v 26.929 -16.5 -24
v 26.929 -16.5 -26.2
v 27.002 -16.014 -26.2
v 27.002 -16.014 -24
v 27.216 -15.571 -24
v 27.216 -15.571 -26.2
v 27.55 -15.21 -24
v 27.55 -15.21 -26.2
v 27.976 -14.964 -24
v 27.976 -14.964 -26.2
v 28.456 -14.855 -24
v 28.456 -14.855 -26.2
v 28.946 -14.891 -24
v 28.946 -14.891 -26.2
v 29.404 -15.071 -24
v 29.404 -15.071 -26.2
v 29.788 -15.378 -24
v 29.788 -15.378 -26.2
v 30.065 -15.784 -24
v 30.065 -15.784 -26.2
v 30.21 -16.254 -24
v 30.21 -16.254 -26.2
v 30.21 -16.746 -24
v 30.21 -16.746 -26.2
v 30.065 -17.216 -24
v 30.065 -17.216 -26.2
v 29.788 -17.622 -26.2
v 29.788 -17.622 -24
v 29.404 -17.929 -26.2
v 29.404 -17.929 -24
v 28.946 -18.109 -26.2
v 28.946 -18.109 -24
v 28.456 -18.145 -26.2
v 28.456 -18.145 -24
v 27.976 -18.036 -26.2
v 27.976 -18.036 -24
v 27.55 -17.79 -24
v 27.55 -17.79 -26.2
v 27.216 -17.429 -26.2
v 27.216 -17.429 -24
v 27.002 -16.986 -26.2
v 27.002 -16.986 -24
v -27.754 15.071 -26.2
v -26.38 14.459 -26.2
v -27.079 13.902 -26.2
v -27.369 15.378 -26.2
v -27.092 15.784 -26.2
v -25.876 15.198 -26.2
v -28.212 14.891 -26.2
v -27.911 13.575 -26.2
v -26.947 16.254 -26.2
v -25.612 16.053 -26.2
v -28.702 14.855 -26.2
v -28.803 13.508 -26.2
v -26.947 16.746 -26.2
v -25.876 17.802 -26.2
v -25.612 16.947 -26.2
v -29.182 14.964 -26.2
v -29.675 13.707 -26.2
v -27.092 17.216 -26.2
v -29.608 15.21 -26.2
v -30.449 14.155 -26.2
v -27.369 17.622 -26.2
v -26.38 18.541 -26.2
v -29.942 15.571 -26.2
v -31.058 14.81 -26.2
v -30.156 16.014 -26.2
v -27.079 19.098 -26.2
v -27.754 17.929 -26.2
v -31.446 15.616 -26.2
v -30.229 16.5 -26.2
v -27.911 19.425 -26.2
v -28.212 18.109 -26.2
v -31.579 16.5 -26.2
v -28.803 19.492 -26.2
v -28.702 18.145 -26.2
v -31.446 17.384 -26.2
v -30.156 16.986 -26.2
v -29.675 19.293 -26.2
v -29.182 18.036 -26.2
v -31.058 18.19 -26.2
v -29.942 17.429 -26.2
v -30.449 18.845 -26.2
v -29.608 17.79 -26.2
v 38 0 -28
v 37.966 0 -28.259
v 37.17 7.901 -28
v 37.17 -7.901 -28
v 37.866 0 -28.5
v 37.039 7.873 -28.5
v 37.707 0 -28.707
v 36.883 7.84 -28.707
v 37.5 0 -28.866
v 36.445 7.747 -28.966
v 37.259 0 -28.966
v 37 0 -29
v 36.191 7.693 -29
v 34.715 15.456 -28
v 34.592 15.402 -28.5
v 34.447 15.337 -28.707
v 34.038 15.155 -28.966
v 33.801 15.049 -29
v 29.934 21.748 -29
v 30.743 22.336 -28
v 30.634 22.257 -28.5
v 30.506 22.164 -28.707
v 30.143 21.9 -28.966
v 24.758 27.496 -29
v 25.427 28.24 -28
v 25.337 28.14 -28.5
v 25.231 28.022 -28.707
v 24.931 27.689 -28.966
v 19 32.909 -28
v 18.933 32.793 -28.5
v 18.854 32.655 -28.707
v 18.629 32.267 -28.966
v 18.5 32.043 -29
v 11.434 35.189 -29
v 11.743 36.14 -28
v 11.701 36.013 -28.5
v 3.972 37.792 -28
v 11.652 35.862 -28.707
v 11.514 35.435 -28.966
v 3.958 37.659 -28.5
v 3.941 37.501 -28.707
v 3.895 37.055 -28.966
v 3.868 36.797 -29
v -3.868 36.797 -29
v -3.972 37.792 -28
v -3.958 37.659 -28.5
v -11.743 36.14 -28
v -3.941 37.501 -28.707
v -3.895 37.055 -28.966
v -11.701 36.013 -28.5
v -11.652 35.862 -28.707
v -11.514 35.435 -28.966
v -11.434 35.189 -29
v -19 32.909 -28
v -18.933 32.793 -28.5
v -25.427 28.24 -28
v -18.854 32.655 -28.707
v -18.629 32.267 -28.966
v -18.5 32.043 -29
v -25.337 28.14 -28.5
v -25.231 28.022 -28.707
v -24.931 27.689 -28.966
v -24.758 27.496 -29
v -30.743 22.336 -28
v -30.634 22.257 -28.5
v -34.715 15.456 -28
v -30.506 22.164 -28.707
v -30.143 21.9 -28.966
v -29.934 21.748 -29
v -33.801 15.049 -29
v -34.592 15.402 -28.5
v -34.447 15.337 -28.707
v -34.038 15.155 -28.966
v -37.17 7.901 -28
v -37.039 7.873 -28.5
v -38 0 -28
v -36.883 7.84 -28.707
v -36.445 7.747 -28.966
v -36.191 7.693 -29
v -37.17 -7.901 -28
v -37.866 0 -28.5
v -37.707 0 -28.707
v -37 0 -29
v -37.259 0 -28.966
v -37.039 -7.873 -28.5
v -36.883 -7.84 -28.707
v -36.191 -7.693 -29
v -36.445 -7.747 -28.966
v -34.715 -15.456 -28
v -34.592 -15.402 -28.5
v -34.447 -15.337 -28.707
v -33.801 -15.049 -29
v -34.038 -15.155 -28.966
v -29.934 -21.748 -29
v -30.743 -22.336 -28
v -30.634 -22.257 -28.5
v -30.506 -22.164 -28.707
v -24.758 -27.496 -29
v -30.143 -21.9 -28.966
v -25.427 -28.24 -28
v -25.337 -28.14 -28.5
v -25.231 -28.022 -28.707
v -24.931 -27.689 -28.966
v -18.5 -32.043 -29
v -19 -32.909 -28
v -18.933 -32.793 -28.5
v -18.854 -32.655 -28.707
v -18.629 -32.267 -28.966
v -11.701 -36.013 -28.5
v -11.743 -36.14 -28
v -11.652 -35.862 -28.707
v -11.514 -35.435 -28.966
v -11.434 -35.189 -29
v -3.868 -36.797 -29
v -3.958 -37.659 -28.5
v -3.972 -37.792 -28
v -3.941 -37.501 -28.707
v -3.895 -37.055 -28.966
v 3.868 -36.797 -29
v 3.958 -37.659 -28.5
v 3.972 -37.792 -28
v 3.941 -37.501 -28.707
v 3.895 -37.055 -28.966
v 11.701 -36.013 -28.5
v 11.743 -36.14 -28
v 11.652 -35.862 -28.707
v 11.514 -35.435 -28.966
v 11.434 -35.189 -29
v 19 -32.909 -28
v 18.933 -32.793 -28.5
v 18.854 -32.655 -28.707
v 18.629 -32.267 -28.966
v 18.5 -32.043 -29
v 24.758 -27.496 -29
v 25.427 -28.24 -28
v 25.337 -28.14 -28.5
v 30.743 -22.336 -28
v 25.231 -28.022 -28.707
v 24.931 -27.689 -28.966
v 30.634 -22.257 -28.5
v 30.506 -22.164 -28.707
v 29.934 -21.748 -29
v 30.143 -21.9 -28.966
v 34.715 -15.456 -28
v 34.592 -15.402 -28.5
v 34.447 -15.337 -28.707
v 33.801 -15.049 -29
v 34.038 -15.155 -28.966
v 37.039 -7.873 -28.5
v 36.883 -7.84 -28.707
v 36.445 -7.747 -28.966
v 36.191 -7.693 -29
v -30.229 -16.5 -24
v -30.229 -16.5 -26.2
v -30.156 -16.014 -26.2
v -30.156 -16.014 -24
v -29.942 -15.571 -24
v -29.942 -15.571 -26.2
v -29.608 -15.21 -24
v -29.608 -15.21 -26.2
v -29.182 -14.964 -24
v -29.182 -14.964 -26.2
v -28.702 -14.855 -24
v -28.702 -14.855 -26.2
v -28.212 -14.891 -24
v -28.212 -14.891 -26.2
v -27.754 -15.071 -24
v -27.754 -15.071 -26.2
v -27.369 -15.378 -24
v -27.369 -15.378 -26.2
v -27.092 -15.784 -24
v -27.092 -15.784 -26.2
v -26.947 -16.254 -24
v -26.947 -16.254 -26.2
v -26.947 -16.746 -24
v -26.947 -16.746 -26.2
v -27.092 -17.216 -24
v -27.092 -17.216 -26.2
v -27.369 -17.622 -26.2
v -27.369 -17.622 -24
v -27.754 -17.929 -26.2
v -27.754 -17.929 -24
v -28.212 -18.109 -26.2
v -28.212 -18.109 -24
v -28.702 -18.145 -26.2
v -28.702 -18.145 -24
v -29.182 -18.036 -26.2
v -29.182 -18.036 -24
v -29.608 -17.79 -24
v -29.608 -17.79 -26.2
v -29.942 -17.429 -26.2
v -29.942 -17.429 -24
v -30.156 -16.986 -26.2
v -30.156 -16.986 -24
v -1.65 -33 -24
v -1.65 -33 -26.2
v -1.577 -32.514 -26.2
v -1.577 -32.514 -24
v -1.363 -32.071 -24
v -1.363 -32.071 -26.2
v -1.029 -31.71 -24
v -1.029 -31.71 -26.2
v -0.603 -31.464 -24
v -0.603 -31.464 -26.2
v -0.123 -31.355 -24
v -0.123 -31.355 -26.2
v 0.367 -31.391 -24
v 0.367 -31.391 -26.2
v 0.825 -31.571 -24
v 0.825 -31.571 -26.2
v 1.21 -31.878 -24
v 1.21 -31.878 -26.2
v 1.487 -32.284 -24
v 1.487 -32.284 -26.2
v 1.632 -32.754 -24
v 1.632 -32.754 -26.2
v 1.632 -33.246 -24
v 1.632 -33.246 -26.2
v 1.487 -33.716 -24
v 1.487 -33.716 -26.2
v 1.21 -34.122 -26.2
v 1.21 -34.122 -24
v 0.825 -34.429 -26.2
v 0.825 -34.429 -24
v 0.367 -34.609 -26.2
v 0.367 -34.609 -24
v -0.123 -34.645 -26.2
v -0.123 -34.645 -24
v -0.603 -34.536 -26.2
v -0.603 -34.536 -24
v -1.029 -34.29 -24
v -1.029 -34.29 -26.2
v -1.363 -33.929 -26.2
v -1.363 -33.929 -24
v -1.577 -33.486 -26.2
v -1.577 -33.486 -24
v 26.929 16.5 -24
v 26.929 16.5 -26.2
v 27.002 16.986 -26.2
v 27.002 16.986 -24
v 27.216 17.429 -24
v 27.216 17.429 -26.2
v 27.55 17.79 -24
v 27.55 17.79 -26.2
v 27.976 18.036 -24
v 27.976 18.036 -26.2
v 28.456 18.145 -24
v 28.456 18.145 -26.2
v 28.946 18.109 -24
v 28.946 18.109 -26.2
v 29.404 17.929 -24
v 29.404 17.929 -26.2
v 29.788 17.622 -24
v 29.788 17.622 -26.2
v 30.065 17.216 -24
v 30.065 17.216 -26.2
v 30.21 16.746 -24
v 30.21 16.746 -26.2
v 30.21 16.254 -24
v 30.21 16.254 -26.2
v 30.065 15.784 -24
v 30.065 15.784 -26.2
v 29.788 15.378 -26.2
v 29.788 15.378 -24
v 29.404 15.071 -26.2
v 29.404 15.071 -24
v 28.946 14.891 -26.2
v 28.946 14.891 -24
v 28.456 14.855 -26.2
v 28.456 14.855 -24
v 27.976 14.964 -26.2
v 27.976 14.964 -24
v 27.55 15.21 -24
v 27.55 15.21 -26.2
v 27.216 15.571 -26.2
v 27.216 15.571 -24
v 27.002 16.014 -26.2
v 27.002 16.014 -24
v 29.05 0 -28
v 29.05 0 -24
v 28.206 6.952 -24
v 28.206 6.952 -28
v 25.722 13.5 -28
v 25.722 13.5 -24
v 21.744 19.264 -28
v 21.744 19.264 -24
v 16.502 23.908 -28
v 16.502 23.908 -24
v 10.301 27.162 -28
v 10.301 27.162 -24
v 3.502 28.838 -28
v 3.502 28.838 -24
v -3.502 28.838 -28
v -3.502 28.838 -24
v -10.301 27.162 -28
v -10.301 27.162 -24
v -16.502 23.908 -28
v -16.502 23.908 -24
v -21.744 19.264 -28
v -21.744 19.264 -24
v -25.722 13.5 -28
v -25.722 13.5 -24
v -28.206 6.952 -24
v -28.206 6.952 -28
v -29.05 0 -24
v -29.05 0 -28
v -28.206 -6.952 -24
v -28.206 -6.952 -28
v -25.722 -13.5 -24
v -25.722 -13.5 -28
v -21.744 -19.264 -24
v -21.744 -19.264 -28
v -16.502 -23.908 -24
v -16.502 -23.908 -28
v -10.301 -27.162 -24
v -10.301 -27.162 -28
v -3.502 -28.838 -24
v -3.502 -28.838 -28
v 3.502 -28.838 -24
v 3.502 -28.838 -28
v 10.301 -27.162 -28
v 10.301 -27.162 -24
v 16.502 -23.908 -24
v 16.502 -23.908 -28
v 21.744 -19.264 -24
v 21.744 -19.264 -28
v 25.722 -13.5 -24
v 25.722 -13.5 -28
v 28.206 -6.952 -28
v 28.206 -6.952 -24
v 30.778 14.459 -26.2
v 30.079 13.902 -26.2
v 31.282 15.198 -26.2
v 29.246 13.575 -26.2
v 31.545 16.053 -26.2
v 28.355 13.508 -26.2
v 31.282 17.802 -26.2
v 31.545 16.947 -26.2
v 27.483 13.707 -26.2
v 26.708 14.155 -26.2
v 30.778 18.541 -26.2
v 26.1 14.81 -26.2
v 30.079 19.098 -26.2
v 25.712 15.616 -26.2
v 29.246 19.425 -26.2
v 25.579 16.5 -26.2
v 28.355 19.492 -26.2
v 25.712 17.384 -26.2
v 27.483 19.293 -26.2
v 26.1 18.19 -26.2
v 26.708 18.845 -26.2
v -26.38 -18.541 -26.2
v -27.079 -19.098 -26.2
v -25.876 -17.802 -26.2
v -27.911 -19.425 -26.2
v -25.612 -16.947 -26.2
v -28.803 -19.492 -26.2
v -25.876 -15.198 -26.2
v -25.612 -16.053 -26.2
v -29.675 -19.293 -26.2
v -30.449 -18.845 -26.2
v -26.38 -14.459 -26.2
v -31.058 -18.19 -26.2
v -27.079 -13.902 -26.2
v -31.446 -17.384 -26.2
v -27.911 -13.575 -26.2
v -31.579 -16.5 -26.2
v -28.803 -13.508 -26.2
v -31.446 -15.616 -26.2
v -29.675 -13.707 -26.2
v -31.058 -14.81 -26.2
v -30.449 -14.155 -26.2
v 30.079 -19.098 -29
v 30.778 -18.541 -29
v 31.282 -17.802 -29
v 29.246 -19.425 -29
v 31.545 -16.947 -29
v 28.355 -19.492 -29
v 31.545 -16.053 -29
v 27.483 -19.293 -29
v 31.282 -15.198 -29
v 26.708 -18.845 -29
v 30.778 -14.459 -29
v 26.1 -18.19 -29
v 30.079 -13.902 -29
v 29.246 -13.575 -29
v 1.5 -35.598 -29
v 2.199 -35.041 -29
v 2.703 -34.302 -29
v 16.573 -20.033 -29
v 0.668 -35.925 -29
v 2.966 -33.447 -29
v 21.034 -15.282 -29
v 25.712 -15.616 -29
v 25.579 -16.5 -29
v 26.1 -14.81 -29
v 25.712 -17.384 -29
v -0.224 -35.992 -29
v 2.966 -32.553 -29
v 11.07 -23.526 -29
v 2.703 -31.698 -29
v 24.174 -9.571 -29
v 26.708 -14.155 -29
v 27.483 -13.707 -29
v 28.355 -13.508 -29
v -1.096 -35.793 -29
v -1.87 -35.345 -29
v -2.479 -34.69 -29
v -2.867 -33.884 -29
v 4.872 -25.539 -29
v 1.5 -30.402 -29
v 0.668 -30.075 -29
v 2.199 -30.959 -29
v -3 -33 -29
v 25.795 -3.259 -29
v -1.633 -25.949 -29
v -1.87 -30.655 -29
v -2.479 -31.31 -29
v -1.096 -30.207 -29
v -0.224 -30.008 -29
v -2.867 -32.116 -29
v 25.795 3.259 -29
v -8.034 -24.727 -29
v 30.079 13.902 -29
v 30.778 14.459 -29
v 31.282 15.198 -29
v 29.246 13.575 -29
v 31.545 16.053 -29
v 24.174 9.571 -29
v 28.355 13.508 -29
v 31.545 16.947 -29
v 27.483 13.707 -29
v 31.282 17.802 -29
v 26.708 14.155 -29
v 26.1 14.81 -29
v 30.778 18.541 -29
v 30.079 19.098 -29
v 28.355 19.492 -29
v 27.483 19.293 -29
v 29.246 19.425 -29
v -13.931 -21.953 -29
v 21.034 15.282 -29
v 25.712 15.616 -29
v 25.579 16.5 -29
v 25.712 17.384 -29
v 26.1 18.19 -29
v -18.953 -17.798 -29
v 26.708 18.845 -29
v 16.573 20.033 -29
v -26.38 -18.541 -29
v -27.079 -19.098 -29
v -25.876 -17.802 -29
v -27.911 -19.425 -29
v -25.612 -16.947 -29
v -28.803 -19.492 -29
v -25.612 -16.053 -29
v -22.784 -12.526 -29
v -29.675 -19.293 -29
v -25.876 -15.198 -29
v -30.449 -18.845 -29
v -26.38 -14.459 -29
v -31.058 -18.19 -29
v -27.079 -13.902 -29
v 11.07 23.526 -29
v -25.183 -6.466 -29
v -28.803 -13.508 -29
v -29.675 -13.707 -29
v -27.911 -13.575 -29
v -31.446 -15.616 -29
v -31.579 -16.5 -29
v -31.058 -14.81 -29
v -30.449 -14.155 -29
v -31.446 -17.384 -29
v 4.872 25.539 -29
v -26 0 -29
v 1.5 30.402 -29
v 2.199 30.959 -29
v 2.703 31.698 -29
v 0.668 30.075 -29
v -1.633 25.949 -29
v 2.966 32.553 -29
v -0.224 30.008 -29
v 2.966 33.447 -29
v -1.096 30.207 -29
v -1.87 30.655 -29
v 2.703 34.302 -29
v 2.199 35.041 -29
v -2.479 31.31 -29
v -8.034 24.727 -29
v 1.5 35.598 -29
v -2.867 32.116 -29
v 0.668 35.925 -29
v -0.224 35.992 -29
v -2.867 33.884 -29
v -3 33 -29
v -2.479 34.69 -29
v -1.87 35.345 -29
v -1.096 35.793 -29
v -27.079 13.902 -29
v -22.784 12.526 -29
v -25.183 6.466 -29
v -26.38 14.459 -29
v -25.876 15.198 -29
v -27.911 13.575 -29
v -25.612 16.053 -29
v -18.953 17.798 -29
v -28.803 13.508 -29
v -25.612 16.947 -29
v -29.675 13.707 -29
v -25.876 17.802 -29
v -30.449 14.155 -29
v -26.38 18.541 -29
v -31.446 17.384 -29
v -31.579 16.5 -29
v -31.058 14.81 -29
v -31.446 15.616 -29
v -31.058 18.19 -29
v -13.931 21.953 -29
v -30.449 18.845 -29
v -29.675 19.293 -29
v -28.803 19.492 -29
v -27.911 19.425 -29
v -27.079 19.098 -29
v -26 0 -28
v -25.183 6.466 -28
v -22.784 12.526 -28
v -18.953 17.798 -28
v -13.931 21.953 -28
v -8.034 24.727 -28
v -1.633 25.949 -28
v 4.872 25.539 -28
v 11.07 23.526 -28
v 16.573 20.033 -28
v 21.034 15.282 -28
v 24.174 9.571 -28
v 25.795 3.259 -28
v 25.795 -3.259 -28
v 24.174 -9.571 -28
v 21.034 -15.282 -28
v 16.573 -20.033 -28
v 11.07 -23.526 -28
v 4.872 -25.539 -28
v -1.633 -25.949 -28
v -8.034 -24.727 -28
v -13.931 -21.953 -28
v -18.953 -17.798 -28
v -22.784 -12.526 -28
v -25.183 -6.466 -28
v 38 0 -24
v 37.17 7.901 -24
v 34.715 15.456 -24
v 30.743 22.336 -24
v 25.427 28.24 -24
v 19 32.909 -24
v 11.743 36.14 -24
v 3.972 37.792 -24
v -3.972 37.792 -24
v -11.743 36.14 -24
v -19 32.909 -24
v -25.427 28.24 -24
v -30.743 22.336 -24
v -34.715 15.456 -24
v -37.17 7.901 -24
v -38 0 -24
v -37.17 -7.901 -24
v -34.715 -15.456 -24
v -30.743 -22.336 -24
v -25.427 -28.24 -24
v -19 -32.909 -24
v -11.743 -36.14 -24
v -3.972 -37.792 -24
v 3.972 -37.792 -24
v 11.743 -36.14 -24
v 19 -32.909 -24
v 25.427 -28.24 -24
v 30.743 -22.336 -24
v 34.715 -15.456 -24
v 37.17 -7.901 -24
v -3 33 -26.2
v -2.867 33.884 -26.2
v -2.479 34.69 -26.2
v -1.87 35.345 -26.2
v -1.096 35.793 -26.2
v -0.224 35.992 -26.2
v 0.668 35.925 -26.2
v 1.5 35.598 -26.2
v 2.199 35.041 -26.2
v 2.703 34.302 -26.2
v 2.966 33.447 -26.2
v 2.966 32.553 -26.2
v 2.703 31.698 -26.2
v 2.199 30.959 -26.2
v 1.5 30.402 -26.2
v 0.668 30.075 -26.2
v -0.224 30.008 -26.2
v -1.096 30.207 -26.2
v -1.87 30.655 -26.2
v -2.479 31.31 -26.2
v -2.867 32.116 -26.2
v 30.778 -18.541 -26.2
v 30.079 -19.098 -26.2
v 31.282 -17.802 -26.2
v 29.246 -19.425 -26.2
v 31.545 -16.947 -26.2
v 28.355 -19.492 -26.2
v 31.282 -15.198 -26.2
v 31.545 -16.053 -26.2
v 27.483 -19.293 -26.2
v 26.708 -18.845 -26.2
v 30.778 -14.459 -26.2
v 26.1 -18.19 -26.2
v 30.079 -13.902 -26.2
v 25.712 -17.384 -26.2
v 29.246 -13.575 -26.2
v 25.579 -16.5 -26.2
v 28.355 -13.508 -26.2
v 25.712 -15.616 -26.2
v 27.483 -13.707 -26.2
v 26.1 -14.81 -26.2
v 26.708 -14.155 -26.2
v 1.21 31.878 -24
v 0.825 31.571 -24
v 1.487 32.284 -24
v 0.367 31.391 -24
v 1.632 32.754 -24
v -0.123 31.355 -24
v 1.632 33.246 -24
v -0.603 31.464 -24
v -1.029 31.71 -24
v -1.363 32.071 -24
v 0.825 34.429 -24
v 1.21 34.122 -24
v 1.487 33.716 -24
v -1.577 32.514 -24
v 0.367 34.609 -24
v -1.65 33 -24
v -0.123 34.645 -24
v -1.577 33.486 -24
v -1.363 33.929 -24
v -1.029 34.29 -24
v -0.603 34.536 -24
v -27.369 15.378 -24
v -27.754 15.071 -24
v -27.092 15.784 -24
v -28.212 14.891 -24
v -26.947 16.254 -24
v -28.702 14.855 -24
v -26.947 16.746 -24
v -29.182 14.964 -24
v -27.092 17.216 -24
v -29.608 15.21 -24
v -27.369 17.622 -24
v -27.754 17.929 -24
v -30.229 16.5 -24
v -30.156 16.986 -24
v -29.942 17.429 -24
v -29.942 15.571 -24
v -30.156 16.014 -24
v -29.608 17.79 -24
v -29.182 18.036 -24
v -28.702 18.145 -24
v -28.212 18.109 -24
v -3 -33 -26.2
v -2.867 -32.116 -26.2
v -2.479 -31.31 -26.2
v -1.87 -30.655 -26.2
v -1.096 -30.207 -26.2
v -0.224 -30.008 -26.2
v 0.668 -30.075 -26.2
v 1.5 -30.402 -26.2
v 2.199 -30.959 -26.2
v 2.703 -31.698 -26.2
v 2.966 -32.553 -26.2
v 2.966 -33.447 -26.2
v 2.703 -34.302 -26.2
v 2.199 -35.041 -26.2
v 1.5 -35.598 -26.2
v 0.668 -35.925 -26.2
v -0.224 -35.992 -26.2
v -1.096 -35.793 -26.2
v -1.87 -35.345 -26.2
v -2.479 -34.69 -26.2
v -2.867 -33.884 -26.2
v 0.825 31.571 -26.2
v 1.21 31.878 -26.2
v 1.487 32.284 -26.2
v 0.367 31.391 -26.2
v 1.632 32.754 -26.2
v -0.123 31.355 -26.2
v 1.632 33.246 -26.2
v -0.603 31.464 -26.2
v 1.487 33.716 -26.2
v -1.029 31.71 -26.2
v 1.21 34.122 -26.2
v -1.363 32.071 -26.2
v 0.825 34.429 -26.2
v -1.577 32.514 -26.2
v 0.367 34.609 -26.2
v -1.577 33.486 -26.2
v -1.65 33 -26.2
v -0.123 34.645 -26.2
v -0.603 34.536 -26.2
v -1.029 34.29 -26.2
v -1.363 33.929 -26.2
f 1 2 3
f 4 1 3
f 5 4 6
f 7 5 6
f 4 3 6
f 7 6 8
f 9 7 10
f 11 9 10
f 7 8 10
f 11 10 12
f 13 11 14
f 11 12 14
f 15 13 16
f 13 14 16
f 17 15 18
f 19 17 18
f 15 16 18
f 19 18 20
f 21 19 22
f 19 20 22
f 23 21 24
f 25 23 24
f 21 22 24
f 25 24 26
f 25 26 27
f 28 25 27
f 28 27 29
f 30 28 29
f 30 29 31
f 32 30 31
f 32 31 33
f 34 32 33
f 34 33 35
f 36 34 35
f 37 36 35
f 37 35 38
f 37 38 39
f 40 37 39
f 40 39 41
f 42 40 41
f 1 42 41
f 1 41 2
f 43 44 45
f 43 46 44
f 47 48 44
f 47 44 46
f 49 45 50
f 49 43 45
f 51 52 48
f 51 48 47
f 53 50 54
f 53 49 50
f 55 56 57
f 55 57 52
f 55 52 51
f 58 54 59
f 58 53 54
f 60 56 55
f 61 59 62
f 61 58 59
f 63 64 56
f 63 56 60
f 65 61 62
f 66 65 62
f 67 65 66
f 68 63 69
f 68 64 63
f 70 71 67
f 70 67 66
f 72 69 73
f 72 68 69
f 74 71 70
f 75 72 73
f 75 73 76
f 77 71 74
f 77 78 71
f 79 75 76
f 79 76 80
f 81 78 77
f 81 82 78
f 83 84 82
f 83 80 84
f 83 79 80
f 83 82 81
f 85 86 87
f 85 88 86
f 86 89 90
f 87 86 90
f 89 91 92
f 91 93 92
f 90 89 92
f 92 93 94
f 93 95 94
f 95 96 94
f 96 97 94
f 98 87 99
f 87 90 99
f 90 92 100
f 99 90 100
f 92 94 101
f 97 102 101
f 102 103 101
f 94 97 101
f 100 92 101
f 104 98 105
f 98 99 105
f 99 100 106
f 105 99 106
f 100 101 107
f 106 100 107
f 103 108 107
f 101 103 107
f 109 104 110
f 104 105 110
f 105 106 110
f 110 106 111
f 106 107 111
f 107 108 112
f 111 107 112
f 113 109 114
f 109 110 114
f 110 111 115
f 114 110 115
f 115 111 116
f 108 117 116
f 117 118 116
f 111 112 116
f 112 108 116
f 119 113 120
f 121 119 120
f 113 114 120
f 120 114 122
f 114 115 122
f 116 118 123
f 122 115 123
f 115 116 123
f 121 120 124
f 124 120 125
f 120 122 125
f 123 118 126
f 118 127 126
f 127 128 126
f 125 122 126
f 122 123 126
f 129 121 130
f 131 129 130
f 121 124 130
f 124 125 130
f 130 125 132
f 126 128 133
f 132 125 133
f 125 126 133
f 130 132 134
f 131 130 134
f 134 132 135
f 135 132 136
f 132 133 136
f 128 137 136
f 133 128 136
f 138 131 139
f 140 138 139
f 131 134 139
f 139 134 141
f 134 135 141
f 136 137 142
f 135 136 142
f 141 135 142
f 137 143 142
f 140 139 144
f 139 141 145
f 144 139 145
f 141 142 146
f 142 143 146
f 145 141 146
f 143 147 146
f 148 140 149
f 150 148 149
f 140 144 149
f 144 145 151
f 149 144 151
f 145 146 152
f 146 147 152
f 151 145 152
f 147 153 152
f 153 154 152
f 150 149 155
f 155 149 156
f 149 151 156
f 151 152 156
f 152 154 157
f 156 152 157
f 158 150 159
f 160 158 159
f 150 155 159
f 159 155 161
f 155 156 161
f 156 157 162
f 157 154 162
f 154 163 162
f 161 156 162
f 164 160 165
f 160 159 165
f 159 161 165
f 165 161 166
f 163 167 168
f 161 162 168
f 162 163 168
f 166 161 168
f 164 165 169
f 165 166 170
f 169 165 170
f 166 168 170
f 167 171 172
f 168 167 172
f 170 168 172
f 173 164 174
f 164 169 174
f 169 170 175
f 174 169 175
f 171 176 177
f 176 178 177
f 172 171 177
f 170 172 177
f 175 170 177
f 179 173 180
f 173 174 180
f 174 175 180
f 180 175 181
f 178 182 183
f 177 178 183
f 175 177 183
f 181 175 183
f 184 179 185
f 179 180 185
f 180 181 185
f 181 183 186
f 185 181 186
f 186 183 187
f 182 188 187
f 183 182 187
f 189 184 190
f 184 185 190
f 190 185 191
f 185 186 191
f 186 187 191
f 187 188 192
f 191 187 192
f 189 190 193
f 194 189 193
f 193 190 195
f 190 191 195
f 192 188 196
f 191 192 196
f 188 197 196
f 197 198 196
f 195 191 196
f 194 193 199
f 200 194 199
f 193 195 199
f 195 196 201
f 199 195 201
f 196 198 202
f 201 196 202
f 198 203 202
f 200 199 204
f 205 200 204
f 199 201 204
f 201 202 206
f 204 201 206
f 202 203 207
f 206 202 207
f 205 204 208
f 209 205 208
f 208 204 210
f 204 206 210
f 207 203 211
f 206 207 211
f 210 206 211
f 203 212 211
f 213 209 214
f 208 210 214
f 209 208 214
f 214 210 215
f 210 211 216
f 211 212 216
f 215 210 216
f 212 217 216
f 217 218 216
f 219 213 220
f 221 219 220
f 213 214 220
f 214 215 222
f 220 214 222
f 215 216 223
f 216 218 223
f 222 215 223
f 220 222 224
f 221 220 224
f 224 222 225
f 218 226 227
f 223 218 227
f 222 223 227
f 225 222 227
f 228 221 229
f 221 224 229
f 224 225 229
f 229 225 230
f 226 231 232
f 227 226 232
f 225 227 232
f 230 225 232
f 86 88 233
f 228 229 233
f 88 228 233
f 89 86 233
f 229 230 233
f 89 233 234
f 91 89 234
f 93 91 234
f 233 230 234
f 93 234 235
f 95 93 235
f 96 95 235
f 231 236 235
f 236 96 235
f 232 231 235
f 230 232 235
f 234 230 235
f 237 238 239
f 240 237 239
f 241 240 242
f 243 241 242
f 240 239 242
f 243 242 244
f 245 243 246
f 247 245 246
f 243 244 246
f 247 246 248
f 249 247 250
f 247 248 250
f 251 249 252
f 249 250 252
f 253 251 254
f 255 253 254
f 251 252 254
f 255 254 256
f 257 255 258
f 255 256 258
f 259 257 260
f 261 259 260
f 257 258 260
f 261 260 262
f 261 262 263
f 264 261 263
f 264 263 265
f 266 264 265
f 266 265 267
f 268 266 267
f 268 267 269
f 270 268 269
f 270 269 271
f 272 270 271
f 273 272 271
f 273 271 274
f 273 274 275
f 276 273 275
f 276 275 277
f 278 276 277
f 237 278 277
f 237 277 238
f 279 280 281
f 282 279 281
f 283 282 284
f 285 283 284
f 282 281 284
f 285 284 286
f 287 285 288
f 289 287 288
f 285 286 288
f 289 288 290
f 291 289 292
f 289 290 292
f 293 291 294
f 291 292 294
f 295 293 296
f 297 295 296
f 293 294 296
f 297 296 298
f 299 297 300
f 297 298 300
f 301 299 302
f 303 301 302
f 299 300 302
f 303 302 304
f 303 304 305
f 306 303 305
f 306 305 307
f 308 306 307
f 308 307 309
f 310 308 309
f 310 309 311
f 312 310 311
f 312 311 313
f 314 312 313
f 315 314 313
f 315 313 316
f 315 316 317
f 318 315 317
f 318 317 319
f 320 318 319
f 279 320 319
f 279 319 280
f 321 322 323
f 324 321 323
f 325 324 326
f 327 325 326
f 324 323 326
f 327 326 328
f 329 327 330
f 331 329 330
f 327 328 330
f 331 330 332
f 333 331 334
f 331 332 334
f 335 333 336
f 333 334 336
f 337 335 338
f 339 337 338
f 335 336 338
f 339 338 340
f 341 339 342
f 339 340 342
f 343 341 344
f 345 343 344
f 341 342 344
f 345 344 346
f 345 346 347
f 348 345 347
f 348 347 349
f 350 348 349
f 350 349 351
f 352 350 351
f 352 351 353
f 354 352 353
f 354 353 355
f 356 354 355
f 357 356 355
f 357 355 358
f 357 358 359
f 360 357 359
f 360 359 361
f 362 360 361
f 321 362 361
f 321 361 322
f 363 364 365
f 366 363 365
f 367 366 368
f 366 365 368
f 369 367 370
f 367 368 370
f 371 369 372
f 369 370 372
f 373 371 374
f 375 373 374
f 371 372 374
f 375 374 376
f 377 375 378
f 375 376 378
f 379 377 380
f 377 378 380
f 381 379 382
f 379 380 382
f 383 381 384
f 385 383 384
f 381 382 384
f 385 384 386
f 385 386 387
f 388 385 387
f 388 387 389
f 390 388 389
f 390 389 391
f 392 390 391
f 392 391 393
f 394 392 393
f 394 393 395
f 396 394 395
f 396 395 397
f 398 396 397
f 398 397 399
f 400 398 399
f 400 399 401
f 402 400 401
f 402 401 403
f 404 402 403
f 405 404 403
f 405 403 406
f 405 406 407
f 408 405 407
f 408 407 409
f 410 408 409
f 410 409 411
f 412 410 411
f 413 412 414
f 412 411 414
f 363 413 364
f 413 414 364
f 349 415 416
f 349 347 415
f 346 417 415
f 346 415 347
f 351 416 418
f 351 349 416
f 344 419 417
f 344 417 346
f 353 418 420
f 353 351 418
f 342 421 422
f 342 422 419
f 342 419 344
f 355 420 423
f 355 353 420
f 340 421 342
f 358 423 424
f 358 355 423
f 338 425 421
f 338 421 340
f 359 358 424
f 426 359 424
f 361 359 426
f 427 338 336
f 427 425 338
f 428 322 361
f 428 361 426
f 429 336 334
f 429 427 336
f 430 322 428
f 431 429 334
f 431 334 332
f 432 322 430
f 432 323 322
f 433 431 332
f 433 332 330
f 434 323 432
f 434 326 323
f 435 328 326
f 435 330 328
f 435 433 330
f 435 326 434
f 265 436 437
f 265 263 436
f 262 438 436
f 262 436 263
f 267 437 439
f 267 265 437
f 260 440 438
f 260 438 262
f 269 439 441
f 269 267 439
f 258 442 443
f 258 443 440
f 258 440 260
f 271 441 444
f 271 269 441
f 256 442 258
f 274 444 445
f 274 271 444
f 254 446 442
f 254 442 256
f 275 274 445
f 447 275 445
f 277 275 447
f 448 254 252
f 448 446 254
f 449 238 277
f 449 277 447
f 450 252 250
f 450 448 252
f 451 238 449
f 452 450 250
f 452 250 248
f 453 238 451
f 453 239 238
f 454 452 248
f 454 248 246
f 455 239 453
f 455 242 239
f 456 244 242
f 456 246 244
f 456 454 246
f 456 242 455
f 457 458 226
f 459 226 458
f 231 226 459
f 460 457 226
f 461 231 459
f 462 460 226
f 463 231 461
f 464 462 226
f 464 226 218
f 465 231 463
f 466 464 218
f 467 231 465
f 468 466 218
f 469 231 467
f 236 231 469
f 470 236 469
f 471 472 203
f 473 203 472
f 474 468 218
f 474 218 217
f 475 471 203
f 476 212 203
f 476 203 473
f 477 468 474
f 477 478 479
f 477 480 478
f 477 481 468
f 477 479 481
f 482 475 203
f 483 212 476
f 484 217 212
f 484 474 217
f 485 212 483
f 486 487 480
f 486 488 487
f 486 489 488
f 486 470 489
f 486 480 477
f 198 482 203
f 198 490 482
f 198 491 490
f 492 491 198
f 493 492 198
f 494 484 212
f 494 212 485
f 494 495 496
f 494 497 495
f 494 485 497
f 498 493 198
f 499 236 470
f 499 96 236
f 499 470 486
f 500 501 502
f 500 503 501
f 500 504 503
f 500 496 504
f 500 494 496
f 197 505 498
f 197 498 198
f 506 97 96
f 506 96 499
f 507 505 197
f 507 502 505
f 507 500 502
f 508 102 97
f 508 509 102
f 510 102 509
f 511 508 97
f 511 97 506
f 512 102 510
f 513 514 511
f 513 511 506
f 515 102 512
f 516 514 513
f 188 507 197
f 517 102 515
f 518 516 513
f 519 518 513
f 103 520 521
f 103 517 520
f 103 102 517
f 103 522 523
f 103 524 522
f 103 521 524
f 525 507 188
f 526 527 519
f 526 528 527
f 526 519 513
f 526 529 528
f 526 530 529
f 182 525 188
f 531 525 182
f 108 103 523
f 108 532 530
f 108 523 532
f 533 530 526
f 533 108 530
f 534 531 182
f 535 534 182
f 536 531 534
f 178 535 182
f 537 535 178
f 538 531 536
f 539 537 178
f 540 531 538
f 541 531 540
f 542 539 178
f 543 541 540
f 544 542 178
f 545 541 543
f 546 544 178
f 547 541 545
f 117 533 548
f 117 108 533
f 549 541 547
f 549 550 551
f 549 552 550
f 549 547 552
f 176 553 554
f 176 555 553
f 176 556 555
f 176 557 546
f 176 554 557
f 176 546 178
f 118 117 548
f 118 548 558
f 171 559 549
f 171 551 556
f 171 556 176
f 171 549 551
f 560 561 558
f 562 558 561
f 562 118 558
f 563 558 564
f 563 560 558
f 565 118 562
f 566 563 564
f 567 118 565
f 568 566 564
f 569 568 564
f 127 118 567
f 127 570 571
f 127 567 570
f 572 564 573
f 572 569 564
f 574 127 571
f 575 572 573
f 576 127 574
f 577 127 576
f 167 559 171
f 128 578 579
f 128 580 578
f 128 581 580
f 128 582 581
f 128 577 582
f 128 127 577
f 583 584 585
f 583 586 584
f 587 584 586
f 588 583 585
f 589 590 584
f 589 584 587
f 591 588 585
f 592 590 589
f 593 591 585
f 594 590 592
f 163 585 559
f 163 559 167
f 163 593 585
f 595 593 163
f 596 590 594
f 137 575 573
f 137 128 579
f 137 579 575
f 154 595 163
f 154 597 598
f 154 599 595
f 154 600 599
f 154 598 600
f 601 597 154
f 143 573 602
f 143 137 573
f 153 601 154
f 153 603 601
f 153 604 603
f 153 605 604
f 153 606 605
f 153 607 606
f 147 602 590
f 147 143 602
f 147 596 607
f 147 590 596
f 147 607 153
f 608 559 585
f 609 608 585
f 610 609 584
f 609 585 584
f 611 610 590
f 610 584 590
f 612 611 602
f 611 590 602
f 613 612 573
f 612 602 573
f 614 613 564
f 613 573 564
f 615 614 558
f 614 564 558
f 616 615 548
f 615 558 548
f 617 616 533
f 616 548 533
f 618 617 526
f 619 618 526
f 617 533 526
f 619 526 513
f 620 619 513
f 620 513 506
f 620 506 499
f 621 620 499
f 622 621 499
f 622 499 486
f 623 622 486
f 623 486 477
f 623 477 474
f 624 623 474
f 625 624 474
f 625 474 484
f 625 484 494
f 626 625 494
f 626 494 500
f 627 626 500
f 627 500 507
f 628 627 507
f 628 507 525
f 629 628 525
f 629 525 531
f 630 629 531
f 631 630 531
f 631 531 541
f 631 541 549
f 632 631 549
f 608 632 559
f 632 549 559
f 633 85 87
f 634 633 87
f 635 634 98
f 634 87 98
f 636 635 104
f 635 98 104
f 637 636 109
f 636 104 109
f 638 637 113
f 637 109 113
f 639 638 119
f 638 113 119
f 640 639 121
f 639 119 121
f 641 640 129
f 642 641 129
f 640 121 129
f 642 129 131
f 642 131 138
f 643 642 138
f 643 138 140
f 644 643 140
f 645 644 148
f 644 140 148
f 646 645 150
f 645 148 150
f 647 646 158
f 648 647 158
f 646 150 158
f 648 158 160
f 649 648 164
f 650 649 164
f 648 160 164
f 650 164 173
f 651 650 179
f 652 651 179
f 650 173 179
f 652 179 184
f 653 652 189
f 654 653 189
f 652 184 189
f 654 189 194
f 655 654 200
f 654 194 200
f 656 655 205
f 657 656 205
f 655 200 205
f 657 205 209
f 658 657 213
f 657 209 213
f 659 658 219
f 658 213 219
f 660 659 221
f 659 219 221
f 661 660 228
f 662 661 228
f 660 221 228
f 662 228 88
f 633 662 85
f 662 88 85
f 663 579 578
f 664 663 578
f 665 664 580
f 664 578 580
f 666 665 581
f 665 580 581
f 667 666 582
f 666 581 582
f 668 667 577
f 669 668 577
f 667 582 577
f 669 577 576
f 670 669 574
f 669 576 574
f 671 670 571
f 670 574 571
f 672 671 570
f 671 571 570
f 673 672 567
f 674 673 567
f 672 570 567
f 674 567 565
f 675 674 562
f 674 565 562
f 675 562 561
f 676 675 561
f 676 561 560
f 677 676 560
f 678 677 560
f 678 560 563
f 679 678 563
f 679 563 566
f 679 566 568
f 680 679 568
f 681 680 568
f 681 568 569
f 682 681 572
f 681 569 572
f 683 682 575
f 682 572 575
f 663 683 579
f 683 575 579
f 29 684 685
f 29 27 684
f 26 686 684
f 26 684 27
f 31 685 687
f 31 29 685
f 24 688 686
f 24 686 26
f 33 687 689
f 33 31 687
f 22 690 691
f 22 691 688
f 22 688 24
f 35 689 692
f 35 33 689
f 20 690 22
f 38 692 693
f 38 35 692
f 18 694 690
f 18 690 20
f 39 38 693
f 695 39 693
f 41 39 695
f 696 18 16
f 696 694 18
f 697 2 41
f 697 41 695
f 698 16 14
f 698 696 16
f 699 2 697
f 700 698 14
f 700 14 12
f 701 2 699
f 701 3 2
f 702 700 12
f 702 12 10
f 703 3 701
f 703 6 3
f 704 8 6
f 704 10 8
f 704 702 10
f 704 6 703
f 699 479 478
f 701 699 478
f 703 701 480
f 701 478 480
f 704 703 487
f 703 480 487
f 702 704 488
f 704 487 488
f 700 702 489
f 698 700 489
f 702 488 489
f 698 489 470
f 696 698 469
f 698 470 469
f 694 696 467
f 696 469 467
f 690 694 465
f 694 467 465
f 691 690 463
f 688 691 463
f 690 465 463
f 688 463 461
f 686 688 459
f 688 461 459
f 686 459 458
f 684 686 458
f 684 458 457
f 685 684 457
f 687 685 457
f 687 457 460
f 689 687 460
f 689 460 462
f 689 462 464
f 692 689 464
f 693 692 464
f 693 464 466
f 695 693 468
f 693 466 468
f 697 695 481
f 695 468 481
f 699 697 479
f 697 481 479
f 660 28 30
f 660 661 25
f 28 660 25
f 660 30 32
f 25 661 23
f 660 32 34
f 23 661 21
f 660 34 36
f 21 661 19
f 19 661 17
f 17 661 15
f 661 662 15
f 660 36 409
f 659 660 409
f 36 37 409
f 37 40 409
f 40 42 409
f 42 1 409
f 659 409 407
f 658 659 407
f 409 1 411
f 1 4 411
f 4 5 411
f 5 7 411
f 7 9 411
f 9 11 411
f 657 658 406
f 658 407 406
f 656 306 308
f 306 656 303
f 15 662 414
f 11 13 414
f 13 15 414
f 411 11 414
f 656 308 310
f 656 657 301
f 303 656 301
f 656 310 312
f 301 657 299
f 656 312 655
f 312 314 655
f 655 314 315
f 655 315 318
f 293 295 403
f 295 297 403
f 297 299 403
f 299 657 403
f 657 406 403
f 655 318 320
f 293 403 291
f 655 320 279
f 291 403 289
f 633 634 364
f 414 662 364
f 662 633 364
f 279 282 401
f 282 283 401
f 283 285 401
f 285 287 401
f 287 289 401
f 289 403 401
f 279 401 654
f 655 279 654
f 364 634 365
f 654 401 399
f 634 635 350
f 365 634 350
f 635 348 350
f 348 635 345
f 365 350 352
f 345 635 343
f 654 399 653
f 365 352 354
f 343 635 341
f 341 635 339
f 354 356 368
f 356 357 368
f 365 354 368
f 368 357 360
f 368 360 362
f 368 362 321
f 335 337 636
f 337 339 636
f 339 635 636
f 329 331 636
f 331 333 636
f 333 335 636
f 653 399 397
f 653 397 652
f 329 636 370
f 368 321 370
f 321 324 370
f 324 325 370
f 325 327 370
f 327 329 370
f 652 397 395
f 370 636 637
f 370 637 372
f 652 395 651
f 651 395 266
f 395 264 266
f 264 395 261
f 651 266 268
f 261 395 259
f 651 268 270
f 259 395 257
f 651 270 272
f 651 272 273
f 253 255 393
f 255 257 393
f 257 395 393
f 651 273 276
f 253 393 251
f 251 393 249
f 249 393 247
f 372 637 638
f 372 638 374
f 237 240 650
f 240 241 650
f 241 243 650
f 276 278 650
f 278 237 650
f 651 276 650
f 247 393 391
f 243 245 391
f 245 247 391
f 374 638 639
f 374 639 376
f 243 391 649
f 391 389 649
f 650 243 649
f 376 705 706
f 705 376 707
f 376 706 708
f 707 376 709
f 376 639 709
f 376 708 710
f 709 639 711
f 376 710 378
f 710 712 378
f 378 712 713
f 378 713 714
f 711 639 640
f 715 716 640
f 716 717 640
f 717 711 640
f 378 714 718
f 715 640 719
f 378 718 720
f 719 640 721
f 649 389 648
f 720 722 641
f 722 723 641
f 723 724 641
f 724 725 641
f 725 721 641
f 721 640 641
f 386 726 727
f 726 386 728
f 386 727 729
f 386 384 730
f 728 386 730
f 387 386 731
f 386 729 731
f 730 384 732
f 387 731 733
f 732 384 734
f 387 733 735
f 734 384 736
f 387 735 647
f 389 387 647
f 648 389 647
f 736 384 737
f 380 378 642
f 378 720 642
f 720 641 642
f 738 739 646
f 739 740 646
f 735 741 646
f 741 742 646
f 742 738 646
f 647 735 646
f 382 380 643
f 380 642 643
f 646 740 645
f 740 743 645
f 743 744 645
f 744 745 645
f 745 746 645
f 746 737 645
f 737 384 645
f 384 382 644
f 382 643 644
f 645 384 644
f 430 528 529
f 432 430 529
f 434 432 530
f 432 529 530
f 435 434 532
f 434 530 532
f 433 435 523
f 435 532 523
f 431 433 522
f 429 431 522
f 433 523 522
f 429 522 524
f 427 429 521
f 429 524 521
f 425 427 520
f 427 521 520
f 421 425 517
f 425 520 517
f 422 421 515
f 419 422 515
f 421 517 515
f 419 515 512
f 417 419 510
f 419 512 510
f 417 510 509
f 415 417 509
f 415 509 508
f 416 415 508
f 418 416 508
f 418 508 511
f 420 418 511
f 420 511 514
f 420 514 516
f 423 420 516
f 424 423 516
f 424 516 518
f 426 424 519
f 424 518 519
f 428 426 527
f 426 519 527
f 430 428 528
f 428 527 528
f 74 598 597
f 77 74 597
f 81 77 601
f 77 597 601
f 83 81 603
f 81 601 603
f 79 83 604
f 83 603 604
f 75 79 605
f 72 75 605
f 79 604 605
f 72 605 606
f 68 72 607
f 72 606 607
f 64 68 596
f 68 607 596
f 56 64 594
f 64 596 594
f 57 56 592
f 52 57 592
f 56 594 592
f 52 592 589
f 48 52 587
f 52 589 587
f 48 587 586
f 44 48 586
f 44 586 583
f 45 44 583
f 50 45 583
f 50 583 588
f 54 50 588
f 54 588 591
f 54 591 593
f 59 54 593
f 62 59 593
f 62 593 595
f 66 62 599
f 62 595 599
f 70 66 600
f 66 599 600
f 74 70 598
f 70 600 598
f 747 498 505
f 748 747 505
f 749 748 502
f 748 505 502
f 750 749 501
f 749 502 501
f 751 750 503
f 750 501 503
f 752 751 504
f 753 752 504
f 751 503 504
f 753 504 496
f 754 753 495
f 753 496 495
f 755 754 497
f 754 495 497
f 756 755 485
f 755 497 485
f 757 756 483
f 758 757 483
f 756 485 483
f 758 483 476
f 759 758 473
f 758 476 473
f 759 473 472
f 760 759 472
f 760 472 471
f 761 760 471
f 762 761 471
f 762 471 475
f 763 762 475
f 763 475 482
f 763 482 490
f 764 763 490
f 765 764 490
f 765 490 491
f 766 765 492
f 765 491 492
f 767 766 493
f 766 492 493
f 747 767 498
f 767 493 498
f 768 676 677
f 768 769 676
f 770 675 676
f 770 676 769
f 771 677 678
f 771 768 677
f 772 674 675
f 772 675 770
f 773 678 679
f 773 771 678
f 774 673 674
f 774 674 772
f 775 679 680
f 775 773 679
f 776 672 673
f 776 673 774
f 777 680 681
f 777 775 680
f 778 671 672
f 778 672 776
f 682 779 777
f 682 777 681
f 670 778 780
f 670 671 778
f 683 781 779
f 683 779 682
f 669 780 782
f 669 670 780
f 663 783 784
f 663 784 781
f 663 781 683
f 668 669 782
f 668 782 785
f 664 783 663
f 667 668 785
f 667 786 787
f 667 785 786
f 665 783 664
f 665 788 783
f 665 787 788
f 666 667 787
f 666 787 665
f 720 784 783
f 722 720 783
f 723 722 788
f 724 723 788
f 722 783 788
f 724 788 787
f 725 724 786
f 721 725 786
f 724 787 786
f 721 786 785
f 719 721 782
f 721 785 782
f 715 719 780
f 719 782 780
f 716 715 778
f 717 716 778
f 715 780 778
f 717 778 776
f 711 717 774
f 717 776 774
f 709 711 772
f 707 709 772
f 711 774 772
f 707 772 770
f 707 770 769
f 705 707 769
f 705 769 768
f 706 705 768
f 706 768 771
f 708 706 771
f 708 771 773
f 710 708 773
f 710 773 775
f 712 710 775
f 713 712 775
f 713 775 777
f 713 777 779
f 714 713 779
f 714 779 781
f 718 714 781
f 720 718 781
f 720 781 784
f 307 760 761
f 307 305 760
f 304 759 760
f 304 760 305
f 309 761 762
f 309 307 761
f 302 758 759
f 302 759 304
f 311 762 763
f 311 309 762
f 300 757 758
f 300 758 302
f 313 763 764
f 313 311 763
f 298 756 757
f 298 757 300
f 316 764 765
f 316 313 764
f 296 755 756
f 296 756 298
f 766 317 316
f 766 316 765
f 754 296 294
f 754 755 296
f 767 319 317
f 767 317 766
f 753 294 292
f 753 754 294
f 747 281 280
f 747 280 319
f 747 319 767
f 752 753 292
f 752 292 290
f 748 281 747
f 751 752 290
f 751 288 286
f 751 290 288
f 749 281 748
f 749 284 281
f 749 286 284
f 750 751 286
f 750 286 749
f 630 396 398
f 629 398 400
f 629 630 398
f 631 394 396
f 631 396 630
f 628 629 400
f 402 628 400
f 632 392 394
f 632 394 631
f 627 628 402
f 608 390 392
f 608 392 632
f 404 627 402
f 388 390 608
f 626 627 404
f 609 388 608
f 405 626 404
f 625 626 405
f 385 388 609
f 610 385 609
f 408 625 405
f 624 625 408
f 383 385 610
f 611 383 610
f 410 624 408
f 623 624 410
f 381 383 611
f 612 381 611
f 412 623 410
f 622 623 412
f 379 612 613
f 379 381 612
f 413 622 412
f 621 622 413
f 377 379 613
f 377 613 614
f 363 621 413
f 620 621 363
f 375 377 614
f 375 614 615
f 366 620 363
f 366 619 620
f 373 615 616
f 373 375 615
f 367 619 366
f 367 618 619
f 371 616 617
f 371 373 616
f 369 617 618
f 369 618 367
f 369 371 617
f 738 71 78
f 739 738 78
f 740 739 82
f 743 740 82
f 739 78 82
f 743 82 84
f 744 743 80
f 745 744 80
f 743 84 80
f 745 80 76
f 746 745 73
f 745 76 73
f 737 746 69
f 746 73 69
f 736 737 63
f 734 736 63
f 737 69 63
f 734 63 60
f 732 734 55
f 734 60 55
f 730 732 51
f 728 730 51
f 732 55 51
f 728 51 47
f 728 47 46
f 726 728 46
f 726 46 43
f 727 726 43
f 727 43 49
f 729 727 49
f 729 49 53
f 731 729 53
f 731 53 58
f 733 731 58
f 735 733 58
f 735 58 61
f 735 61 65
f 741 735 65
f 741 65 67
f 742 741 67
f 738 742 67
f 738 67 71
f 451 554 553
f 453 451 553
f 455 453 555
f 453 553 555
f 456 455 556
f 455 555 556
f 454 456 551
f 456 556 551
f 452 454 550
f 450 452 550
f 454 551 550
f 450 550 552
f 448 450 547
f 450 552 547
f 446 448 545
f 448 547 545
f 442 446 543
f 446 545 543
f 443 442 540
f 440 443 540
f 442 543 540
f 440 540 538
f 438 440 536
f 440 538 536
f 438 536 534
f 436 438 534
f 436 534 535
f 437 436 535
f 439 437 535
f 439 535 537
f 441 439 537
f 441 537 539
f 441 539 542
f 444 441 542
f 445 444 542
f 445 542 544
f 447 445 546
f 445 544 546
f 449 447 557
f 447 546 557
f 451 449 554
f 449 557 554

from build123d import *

# Parameters (mm, degrees)
SKETCH_1_W                    = 38
SKETCH_1_H                    = 5
HOLE_WIZARD_M48_1_D           = 52
HOLE_WIZARD_M48_1_DEPTH       = 5
HOLE_WIZARD_M48_1_CBORE_D     = 58.1
HOLE_WIZARD_M48_1_CBORE_DEPTH = 4
SKETCH_16_R                   = 1.65
CUT_EXTRUDE_9_DEPTH           = 6
SKETCH_17_R                   = 3
CUT_EXTRUDE_10_DEPTH          = 2.8
FILLET_2_R                    = 1


with BuildPart() as part:
    # 草图1 → 旋转1 (revolve)
    with BuildSketch(Plane(origin=(0, 0, 0), x_dir=(1, 0, 0), z_dir=(0, 1, 0))):
        with Locations((19, 26.5)):
            Rectangle(SKETCH_1_W, SKETCH_1_H)
    revolve(axis=Axis((0, 0, -29), (0, 0, 1)))

    # M48 六角头螺栓的柱形沉头孔1
    with Locations(Plane.XY.offset(-24)):
        with Locations((0, 0)):
            CounterBoreHole(HOLE_WIZARD_M48_1_D / 2, HOLE_WIZARD_M48_1_CBORE_D / 2, HOLE_WIZARD_M48_1_CBORE_DEPTH, depth=HOLE_WIZARD_M48_1_DEPTH)

    # 草图16 → 切除-拉伸9 (cut, through all)
    with BuildSketch(Plane(origin=(0, 0, -29), x_dir=(-1, 0, 0), z_dir=(0, 0, -1))):
        with Locations((0, -33)):
            Circle(SKETCH_16_R)
        with Locations((-28.578838325, -16.5)):
            Circle(SKETCH_16_R)
        with Locations((-28.578838325, 16.5)):
            Circle(SKETCH_16_R)
        with Locations((0, 33)):
            Circle(SKETCH_16_R)
        with Locations((28.578838325, 16.5)):
            Circle(SKETCH_16_R)
        with Locations((28.578838325, -16.5)):
            Circle(SKETCH_16_R)
    extrude(amount=-CUT_EXTRUDE_9_DEPTH, mode=Mode.SUBTRACT)

    # 草图17 → 切除-拉伸10 (cut)
    with BuildSketch(Plane(origin=(0, 0, -29), x_dir=(-1, 0, 0), z_dir=(0, 0, -1))):
        with Locations((0, -33)):
            Circle(SKETCH_17_R)
        with Locations((-28.578838325, -16.5)):
            Circle(SKETCH_17_R)
        with Locations((-28.578838325, 16.5)):
            Circle(SKETCH_17_R)
        with Locations((0, 33)):
            Circle(SKETCH_17_R)
        with Locations((28.578838325, 16.5)):
            Circle(SKETCH_17_R)
        with Locations((28.578838325, -16.5)):
            Circle(SKETCH_17_R)
    extrude(amount=-CUT_EXTRUDE_10_DEPTH, mode=Mode.SUBTRACT)

    # 圆角2
    fillet_2_edges = [part.edges().sort_by_distance(p)[0] for p in [
        (-38, 0, -29),
    ]]
    fillet(fillet_2_edges, radius=FILLET_2_R)


solid = part.part
